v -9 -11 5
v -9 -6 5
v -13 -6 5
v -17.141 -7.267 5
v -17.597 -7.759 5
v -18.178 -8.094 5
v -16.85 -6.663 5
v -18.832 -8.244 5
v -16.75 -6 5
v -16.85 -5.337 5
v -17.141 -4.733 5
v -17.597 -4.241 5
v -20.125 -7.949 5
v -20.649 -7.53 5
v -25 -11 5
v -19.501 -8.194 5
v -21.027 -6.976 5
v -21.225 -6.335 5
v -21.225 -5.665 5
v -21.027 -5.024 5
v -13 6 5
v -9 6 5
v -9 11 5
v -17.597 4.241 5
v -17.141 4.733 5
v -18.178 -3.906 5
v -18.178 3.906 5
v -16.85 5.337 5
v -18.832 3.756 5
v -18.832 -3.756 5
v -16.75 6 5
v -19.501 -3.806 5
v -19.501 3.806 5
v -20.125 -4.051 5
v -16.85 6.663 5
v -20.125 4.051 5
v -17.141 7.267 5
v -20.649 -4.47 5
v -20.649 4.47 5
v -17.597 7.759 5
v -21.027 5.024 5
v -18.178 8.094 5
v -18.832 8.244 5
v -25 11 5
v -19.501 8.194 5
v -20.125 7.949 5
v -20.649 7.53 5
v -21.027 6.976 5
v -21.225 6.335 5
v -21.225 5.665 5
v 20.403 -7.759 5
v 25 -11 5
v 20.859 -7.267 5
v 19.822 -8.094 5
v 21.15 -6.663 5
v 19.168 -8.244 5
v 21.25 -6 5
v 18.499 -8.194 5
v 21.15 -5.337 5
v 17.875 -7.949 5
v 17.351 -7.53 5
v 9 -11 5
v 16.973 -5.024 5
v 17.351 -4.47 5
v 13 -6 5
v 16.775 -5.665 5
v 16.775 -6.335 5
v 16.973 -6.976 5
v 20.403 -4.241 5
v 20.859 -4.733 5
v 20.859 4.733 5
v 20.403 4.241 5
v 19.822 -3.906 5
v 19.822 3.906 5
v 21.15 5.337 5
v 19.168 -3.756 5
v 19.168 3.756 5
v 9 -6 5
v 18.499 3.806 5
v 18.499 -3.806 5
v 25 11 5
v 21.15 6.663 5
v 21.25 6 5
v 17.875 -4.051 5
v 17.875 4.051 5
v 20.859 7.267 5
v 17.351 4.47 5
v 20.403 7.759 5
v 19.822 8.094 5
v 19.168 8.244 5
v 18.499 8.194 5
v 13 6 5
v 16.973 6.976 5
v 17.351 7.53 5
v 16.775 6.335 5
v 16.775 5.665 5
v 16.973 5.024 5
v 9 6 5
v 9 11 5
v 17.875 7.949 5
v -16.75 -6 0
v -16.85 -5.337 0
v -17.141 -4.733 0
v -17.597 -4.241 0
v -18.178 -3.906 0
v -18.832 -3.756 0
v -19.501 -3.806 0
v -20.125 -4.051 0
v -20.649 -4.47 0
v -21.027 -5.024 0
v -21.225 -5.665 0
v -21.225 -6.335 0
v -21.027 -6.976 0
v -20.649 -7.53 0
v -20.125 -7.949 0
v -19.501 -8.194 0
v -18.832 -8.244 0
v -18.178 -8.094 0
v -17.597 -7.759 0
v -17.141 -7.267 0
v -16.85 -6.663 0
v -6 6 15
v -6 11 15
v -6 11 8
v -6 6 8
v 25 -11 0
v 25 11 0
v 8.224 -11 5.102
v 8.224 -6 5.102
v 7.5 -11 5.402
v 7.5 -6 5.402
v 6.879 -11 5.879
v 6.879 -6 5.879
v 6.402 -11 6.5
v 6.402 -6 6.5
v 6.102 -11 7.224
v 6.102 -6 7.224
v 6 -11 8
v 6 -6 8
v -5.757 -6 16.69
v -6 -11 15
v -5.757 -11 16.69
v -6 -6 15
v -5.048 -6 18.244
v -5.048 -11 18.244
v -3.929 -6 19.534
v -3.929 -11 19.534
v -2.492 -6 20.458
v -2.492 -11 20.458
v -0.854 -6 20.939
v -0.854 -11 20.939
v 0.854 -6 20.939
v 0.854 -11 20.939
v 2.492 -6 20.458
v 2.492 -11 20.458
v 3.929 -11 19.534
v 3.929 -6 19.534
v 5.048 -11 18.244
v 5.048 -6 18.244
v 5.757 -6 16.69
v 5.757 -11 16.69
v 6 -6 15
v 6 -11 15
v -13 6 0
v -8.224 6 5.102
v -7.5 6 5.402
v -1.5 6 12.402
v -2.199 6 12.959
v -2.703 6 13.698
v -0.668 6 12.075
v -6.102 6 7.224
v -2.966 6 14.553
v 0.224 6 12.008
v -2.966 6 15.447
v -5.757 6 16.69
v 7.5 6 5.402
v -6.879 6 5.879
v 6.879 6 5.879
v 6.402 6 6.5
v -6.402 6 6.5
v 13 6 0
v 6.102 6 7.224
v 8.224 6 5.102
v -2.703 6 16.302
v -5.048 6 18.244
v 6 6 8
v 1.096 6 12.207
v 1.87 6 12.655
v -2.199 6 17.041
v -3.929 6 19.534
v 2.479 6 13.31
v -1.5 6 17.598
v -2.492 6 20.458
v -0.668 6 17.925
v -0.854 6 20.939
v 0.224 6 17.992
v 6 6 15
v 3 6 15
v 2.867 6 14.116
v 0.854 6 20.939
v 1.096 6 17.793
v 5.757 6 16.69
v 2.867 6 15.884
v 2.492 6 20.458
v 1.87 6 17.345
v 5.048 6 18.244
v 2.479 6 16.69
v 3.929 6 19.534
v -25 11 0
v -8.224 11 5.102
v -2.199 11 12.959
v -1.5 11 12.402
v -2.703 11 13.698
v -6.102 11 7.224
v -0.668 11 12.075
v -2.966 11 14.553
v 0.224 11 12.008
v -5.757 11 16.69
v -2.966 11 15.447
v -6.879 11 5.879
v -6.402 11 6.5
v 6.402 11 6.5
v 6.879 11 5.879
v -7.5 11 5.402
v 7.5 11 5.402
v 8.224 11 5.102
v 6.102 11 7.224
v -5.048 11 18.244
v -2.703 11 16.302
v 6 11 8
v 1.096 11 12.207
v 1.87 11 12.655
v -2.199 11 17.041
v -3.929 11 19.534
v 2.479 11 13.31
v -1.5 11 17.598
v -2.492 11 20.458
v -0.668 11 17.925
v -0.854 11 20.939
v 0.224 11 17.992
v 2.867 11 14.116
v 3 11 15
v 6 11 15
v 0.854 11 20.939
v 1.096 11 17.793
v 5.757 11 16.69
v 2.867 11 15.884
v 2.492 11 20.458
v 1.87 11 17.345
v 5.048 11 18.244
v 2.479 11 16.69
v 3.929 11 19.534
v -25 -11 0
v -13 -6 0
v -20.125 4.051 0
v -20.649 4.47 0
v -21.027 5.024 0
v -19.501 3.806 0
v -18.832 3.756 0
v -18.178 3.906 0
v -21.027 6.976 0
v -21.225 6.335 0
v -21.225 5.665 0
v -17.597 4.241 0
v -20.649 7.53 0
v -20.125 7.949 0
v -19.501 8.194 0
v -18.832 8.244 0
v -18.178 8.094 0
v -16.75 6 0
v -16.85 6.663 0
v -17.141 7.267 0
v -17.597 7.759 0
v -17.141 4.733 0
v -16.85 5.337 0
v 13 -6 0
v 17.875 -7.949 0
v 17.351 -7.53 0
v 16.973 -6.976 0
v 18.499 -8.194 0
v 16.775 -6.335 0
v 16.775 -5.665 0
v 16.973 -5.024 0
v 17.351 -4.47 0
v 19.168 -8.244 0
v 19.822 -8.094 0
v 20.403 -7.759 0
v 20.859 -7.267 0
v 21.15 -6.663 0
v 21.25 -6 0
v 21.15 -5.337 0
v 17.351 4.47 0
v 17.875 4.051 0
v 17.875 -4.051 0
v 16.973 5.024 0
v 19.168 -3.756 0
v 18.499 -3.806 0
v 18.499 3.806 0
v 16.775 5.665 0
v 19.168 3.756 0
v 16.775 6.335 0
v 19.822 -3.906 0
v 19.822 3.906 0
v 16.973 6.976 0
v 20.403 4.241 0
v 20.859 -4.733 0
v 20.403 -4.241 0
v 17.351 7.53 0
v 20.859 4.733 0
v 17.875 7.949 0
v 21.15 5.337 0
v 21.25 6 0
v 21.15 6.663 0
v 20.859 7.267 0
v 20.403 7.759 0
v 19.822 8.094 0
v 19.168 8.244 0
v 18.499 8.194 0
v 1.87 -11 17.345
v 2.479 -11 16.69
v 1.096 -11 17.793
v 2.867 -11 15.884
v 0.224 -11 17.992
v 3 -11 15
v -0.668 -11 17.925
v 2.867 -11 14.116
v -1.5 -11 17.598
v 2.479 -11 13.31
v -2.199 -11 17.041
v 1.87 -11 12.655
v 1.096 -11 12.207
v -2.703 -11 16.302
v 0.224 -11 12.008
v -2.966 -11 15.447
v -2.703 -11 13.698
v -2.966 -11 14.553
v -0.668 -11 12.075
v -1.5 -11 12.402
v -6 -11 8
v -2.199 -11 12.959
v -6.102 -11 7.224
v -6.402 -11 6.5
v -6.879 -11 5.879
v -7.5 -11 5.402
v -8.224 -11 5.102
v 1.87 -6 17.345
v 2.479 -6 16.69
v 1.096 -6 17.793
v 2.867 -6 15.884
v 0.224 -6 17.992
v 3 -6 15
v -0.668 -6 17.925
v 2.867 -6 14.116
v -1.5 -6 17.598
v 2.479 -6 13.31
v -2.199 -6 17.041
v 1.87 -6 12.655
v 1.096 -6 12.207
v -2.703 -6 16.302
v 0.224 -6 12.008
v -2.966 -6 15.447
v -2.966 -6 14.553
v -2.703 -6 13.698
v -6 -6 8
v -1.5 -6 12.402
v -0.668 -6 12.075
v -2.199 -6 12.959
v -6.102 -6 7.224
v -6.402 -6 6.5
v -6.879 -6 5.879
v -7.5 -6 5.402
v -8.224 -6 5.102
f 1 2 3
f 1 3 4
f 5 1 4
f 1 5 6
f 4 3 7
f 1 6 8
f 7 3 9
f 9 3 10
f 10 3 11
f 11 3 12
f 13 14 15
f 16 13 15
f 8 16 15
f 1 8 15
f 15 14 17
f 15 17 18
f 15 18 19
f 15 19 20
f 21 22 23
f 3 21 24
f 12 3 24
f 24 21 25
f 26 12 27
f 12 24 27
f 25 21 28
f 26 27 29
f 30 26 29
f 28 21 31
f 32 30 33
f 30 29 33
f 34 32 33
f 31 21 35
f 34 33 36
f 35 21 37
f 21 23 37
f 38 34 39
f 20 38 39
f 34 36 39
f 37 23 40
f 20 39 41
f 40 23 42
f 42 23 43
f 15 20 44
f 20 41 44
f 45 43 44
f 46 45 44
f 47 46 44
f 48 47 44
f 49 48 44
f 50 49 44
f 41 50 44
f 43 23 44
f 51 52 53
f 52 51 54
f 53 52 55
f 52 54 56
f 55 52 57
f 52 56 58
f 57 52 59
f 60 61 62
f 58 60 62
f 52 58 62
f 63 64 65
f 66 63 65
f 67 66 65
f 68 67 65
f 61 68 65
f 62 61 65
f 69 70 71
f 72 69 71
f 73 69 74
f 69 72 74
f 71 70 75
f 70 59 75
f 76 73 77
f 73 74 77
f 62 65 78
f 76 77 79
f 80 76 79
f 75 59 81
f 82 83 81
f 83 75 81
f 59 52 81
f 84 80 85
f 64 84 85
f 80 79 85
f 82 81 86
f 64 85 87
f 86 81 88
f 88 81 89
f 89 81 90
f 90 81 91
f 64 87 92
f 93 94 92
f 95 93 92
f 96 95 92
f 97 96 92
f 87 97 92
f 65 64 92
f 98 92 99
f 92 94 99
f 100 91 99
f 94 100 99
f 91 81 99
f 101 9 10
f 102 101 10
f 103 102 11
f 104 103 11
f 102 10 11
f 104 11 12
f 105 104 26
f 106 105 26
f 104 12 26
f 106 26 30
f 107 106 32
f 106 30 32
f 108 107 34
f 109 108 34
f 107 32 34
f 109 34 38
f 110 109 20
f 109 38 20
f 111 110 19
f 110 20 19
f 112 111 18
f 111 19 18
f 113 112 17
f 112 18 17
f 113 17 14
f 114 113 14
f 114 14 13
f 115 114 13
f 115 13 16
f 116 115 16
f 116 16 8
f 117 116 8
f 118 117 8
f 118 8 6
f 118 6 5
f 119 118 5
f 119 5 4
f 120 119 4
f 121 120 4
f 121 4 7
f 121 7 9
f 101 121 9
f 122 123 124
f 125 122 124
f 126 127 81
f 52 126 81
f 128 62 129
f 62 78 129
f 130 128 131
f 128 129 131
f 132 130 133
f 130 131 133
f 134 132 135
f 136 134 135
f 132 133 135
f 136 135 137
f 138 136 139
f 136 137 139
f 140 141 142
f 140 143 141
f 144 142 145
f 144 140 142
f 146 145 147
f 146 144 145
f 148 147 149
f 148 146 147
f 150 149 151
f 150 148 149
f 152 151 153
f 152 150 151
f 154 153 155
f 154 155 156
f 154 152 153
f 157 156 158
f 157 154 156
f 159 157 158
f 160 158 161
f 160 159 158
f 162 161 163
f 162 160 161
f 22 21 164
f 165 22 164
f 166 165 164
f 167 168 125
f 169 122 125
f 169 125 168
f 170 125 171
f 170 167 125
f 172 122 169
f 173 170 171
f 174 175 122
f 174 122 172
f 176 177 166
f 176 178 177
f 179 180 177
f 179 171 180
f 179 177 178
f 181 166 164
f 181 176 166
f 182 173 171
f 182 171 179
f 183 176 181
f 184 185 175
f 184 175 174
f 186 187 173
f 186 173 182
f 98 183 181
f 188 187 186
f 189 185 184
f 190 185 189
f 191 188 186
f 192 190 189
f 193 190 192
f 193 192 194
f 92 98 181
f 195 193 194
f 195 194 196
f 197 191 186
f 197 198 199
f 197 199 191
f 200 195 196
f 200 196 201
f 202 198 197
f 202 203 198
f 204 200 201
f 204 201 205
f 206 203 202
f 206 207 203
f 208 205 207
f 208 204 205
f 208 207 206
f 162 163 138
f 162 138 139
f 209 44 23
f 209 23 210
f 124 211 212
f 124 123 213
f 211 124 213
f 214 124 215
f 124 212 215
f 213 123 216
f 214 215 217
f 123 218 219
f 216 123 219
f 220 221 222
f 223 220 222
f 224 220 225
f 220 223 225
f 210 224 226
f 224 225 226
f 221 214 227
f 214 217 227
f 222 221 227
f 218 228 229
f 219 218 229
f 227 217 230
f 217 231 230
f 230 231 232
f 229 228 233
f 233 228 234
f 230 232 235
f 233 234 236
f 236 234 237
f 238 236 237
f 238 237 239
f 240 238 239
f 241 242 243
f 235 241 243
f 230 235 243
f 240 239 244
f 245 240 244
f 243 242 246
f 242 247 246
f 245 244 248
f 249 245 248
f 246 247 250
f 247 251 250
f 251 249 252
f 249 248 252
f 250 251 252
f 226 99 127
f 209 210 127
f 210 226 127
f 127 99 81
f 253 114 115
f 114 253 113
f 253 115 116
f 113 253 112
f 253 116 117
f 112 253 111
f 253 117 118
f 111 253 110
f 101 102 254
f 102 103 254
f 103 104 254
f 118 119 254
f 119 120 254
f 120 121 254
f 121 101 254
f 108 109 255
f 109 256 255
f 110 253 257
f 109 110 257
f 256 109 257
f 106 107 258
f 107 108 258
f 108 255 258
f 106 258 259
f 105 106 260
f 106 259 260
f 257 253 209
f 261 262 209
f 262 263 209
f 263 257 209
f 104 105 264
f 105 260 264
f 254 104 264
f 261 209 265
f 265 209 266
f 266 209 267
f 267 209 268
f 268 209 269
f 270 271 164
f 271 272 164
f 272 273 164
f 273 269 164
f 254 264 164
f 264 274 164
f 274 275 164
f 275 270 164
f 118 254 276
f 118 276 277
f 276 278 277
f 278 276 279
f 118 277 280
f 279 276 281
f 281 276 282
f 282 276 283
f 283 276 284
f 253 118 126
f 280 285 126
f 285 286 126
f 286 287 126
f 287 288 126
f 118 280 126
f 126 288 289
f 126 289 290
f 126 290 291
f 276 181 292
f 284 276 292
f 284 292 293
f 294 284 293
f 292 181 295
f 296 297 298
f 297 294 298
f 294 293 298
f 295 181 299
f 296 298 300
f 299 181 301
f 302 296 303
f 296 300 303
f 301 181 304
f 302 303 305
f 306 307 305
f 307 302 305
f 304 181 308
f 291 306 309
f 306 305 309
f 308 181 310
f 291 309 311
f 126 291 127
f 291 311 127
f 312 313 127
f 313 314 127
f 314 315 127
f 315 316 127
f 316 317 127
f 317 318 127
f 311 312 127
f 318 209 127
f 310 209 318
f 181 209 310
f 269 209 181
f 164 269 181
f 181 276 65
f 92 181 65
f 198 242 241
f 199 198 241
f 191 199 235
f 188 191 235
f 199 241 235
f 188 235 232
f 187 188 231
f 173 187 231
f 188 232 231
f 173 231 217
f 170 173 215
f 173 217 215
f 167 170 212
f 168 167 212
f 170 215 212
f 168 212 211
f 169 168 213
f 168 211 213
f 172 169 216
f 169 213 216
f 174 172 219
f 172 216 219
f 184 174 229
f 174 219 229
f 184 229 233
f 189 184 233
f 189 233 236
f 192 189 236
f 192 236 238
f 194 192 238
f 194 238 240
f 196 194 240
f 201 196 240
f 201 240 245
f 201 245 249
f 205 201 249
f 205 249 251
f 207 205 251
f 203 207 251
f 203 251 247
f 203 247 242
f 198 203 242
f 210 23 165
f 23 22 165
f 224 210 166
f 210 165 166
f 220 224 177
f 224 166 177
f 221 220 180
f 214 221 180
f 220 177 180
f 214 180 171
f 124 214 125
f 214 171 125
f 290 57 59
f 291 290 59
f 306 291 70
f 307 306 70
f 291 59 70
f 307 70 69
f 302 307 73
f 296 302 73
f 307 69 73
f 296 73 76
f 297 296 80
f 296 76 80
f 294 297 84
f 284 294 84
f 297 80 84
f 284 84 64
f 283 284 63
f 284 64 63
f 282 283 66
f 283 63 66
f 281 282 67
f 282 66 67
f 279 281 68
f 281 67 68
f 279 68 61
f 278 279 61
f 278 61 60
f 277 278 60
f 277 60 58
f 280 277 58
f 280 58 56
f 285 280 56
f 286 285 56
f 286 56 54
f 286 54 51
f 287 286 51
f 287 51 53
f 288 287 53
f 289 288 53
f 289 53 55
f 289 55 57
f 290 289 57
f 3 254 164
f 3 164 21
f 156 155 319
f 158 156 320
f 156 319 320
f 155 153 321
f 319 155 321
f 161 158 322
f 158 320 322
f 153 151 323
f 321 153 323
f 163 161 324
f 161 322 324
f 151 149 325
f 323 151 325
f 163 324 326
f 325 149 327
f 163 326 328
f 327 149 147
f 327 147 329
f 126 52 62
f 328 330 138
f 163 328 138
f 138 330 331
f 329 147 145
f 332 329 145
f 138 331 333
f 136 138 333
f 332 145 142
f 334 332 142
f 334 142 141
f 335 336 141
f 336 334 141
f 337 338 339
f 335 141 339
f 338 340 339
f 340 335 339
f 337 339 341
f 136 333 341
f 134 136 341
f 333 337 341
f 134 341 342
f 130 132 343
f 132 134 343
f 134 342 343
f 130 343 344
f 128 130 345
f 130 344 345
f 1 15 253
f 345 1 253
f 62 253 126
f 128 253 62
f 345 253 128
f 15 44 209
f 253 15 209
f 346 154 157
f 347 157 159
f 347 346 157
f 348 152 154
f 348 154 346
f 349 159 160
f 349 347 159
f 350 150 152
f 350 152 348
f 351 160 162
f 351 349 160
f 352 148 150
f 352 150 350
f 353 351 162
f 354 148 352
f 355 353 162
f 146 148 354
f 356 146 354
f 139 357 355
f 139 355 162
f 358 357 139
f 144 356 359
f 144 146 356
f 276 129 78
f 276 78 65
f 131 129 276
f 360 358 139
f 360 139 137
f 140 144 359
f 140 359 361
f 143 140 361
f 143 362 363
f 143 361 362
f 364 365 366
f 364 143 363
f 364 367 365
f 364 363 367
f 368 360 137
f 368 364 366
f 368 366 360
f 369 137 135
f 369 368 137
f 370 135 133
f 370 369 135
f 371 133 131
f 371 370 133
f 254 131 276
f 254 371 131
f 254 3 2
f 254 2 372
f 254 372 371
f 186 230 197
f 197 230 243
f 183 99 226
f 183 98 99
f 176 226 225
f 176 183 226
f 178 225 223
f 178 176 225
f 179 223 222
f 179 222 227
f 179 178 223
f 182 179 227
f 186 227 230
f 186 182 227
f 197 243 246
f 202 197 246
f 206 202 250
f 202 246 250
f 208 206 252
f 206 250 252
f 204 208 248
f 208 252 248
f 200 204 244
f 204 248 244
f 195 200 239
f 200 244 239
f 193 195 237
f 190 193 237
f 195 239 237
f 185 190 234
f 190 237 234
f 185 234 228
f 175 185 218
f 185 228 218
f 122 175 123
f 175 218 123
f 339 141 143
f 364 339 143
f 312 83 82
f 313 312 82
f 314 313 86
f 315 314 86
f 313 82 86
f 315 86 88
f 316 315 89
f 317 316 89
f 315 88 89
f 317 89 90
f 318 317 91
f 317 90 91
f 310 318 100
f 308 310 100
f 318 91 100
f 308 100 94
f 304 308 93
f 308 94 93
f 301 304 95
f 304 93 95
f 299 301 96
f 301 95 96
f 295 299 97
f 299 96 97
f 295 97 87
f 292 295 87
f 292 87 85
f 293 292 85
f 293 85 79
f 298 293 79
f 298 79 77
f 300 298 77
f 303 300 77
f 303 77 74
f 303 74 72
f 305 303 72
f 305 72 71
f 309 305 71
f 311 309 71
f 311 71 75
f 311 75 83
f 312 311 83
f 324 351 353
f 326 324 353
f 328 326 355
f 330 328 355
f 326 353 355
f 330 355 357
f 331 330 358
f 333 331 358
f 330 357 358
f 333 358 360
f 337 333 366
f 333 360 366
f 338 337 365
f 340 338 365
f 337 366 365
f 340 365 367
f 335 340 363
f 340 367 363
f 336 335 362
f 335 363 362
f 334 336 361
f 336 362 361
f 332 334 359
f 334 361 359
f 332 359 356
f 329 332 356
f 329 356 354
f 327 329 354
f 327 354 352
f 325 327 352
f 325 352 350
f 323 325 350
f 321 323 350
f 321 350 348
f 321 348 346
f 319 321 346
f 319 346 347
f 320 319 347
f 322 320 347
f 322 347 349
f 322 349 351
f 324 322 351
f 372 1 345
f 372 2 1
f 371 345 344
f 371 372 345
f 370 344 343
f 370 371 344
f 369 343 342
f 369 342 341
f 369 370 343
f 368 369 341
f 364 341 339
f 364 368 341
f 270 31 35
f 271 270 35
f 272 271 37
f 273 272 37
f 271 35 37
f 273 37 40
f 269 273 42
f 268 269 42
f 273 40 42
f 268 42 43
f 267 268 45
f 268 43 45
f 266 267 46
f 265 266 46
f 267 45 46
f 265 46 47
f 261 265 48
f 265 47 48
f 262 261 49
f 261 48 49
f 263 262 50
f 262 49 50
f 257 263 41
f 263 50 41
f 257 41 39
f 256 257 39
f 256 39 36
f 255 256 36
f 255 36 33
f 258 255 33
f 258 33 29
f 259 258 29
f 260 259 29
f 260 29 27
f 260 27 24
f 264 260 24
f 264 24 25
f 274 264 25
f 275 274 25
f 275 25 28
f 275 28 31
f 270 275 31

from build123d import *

# Parameters (mm, degrees)
SKETCH_1_W                = 6
SKETCH_1_H                = 5
REVOLVE_1_ANGLE           = 180
SKETCH_2_W                = 12
SKETCH_2_H                = 5
EXTRUDE_1_DEPTH           = 15
SKETCH_3_W                = 5
SKETCH_3_H                = 5
EXTRUDE_2_DEPTH           = 19
SKETCH_4_W                = 5
SKETCH_4_H                = 5
EXTRUDE_3_DEPTH           = 19
SKETCH_5_W                = 12
SKETCH_5_H                = 5
EXTRUDE_4_DEPTH           = 12
SKETCH_6_W                = 12
SKETCH_6_H                = 5
EXTRUDE_5_DEPTH           = 12
EXTRUDE_START             = 5
EXTRUDE_6_DEPTH           = 5
HOLE_WIZARD_6_0_6_1_D     = 6
HOLE_WIZARD_6_0_6_1_DEPTH = 5
HOLE_WIZARD_6_0_6_2_D     = 6
HOLE_WIZARD_6_0_6_2_DEPTH = 22
HOLE_WIZARD_4_5_4_5_1_D   = 4.5
FILLET_1_R                = 3


with BuildPart() as part:
    # 草图1 → 旋转1 (revolve)
    with BuildSketch(Plane(origin=(0, 0, 15), x_dir=(-1, 0, 0), z_dir=(0, 0, -1))):
        with Locations((3, -8.5)):
            Rectangle(SKETCH_1_W, SKETCH_1_H)
    revolve(axis=Axis((0, -6, 15), (0, 1, 0)), revolution_arc=REVOLVE_1_ANGLE)

    # 草图2 → 凸台-拉伸1 (add)
    with BuildSketch(Plane(origin=(0, 0, 15), x_dir=(-1, 0, 0), z_dir=(0, 0, -1))):
        with Locations((0, -8.5)):
            Rectangle(SKETCH_2_W, SKETCH_2_H)
    extrude(amount=EXTRUDE_1_DEPTH)

    # 草图3 → 凸台-拉伸2 (add)
    with BuildSketch(Plane.ZY.offset(6)):
        with Locations((2.5, -8.5)):
            Rectangle(SKETCH_3_W, SKETCH_3_H)
    extrude(amount=EXTRUDE_2_DEPTH)

    # 草图4 → 凸台-拉伸3 (add)
    with BuildSketch(Plane(origin=(6, 0, 0), x_dir=(0, 0, -1), z_dir=(1, 0, 0))):
        with Locations((-2.5, -8.5)):
            Rectangle(SKETCH_4_W, SKETCH_4_H)
    extrude(amount=EXTRUDE_3_DEPTH)

    # 草图5 → 凸台-拉伸4 (add)
    with BuildSketch(Plane(origin=(0, -6, 0), x_dir=(-1, 0, 0), z_dir=(0, 1, 0))):
        with Locations((-19, 2.5)):
            Rectangle(SKETCH_5_W, SKETCH_5_H)
    extrude(amount=EXTRUDE_4_DEPTH)

    # 草图6 → 凸台-拉伸5 (add)
    with BuildSketch(Plane(origin=(0, -6, 0), x_dir=(-1, 0, 0), z_dir=(0, 1, 0))):
        with Locations((19, 2.5)):
            Rectangle(SKETCH_6_W, SKETCH_6_H)
    extrude(amount=EXTRUDE_5_DEPTH)

    # 草图7 → 凸台-拉伸6 (add)
    with BuildSketch(Plane(origin=(0, 6, 0), x_dir=(-1, 0, 0), z_dir=(0, 1, 0)).offset(EXTRUDE_START)):
        with BuildLine():
            Line((25, 5), (25, 0))
            Line((25, 0), (-25, 0))
            Line((-25, 0), (-25, 5))
            Line((-25, 5), (-6, 5))
            Line((-6, 5), (-6, 15))
            ThreePointArc((-6, 15), (0, 21), (6, 15))
            Line((6, 15), (6, 5))
            Line((6, 5), (25, 5))
        make_face()
    extrude(amount=-EXTRUDE_6_DEPTH)

    # Ø6.0 (6) 直径孔1
    with Locations(Plane(origin=(0, 6, 0), x_dir=(-1, 0, 0), z_dir=(0, -1, 0))):
        with Locations((0, -15)):
            Hole(HOLE_WIZARD_6_0_6_1_D / 2, depth=HOLE_WIZARD_6_0_6_1_DEPTH)

    # Ø6.0 (6) 直径孔2
    with Locations(Plane(origin=(0, -11, 0), x_dir=(-1, 0, 0), z_dir=(0, -1, 0))):
        with Locations((0, -15)):
            Hole(HOLE_WIZARD_6_0_6_2_D / 2, depth=HOLE_WIZARD_6_0_6_2_DEPTH)

    # Ø4.5 (4.5) 直径孔1 (through all)
    with Locations(Plane(origin=(0, 0, 0), x_dir=(-1, 0, 0), z_dir=(0, 0, -1))):
        with Locations((-19, -6), (19, 6), (19, -6), (-19, 6)):
            Hole(HOLE_WIZARD_4_5_4_5_1_D / 2)

    # 圆角1
    fillet_1_edges = [part.edges().sort_by_distance(p)[0] for p in [
        (-6, -8.5, 5),
        (6, -8.5, 5),
        (-6, 8.5, 5),
        (6, 8.5, 5),
    ]]
    fillet(fillet_1_edges, radius=FILLET_1_R)


solid = part.part
